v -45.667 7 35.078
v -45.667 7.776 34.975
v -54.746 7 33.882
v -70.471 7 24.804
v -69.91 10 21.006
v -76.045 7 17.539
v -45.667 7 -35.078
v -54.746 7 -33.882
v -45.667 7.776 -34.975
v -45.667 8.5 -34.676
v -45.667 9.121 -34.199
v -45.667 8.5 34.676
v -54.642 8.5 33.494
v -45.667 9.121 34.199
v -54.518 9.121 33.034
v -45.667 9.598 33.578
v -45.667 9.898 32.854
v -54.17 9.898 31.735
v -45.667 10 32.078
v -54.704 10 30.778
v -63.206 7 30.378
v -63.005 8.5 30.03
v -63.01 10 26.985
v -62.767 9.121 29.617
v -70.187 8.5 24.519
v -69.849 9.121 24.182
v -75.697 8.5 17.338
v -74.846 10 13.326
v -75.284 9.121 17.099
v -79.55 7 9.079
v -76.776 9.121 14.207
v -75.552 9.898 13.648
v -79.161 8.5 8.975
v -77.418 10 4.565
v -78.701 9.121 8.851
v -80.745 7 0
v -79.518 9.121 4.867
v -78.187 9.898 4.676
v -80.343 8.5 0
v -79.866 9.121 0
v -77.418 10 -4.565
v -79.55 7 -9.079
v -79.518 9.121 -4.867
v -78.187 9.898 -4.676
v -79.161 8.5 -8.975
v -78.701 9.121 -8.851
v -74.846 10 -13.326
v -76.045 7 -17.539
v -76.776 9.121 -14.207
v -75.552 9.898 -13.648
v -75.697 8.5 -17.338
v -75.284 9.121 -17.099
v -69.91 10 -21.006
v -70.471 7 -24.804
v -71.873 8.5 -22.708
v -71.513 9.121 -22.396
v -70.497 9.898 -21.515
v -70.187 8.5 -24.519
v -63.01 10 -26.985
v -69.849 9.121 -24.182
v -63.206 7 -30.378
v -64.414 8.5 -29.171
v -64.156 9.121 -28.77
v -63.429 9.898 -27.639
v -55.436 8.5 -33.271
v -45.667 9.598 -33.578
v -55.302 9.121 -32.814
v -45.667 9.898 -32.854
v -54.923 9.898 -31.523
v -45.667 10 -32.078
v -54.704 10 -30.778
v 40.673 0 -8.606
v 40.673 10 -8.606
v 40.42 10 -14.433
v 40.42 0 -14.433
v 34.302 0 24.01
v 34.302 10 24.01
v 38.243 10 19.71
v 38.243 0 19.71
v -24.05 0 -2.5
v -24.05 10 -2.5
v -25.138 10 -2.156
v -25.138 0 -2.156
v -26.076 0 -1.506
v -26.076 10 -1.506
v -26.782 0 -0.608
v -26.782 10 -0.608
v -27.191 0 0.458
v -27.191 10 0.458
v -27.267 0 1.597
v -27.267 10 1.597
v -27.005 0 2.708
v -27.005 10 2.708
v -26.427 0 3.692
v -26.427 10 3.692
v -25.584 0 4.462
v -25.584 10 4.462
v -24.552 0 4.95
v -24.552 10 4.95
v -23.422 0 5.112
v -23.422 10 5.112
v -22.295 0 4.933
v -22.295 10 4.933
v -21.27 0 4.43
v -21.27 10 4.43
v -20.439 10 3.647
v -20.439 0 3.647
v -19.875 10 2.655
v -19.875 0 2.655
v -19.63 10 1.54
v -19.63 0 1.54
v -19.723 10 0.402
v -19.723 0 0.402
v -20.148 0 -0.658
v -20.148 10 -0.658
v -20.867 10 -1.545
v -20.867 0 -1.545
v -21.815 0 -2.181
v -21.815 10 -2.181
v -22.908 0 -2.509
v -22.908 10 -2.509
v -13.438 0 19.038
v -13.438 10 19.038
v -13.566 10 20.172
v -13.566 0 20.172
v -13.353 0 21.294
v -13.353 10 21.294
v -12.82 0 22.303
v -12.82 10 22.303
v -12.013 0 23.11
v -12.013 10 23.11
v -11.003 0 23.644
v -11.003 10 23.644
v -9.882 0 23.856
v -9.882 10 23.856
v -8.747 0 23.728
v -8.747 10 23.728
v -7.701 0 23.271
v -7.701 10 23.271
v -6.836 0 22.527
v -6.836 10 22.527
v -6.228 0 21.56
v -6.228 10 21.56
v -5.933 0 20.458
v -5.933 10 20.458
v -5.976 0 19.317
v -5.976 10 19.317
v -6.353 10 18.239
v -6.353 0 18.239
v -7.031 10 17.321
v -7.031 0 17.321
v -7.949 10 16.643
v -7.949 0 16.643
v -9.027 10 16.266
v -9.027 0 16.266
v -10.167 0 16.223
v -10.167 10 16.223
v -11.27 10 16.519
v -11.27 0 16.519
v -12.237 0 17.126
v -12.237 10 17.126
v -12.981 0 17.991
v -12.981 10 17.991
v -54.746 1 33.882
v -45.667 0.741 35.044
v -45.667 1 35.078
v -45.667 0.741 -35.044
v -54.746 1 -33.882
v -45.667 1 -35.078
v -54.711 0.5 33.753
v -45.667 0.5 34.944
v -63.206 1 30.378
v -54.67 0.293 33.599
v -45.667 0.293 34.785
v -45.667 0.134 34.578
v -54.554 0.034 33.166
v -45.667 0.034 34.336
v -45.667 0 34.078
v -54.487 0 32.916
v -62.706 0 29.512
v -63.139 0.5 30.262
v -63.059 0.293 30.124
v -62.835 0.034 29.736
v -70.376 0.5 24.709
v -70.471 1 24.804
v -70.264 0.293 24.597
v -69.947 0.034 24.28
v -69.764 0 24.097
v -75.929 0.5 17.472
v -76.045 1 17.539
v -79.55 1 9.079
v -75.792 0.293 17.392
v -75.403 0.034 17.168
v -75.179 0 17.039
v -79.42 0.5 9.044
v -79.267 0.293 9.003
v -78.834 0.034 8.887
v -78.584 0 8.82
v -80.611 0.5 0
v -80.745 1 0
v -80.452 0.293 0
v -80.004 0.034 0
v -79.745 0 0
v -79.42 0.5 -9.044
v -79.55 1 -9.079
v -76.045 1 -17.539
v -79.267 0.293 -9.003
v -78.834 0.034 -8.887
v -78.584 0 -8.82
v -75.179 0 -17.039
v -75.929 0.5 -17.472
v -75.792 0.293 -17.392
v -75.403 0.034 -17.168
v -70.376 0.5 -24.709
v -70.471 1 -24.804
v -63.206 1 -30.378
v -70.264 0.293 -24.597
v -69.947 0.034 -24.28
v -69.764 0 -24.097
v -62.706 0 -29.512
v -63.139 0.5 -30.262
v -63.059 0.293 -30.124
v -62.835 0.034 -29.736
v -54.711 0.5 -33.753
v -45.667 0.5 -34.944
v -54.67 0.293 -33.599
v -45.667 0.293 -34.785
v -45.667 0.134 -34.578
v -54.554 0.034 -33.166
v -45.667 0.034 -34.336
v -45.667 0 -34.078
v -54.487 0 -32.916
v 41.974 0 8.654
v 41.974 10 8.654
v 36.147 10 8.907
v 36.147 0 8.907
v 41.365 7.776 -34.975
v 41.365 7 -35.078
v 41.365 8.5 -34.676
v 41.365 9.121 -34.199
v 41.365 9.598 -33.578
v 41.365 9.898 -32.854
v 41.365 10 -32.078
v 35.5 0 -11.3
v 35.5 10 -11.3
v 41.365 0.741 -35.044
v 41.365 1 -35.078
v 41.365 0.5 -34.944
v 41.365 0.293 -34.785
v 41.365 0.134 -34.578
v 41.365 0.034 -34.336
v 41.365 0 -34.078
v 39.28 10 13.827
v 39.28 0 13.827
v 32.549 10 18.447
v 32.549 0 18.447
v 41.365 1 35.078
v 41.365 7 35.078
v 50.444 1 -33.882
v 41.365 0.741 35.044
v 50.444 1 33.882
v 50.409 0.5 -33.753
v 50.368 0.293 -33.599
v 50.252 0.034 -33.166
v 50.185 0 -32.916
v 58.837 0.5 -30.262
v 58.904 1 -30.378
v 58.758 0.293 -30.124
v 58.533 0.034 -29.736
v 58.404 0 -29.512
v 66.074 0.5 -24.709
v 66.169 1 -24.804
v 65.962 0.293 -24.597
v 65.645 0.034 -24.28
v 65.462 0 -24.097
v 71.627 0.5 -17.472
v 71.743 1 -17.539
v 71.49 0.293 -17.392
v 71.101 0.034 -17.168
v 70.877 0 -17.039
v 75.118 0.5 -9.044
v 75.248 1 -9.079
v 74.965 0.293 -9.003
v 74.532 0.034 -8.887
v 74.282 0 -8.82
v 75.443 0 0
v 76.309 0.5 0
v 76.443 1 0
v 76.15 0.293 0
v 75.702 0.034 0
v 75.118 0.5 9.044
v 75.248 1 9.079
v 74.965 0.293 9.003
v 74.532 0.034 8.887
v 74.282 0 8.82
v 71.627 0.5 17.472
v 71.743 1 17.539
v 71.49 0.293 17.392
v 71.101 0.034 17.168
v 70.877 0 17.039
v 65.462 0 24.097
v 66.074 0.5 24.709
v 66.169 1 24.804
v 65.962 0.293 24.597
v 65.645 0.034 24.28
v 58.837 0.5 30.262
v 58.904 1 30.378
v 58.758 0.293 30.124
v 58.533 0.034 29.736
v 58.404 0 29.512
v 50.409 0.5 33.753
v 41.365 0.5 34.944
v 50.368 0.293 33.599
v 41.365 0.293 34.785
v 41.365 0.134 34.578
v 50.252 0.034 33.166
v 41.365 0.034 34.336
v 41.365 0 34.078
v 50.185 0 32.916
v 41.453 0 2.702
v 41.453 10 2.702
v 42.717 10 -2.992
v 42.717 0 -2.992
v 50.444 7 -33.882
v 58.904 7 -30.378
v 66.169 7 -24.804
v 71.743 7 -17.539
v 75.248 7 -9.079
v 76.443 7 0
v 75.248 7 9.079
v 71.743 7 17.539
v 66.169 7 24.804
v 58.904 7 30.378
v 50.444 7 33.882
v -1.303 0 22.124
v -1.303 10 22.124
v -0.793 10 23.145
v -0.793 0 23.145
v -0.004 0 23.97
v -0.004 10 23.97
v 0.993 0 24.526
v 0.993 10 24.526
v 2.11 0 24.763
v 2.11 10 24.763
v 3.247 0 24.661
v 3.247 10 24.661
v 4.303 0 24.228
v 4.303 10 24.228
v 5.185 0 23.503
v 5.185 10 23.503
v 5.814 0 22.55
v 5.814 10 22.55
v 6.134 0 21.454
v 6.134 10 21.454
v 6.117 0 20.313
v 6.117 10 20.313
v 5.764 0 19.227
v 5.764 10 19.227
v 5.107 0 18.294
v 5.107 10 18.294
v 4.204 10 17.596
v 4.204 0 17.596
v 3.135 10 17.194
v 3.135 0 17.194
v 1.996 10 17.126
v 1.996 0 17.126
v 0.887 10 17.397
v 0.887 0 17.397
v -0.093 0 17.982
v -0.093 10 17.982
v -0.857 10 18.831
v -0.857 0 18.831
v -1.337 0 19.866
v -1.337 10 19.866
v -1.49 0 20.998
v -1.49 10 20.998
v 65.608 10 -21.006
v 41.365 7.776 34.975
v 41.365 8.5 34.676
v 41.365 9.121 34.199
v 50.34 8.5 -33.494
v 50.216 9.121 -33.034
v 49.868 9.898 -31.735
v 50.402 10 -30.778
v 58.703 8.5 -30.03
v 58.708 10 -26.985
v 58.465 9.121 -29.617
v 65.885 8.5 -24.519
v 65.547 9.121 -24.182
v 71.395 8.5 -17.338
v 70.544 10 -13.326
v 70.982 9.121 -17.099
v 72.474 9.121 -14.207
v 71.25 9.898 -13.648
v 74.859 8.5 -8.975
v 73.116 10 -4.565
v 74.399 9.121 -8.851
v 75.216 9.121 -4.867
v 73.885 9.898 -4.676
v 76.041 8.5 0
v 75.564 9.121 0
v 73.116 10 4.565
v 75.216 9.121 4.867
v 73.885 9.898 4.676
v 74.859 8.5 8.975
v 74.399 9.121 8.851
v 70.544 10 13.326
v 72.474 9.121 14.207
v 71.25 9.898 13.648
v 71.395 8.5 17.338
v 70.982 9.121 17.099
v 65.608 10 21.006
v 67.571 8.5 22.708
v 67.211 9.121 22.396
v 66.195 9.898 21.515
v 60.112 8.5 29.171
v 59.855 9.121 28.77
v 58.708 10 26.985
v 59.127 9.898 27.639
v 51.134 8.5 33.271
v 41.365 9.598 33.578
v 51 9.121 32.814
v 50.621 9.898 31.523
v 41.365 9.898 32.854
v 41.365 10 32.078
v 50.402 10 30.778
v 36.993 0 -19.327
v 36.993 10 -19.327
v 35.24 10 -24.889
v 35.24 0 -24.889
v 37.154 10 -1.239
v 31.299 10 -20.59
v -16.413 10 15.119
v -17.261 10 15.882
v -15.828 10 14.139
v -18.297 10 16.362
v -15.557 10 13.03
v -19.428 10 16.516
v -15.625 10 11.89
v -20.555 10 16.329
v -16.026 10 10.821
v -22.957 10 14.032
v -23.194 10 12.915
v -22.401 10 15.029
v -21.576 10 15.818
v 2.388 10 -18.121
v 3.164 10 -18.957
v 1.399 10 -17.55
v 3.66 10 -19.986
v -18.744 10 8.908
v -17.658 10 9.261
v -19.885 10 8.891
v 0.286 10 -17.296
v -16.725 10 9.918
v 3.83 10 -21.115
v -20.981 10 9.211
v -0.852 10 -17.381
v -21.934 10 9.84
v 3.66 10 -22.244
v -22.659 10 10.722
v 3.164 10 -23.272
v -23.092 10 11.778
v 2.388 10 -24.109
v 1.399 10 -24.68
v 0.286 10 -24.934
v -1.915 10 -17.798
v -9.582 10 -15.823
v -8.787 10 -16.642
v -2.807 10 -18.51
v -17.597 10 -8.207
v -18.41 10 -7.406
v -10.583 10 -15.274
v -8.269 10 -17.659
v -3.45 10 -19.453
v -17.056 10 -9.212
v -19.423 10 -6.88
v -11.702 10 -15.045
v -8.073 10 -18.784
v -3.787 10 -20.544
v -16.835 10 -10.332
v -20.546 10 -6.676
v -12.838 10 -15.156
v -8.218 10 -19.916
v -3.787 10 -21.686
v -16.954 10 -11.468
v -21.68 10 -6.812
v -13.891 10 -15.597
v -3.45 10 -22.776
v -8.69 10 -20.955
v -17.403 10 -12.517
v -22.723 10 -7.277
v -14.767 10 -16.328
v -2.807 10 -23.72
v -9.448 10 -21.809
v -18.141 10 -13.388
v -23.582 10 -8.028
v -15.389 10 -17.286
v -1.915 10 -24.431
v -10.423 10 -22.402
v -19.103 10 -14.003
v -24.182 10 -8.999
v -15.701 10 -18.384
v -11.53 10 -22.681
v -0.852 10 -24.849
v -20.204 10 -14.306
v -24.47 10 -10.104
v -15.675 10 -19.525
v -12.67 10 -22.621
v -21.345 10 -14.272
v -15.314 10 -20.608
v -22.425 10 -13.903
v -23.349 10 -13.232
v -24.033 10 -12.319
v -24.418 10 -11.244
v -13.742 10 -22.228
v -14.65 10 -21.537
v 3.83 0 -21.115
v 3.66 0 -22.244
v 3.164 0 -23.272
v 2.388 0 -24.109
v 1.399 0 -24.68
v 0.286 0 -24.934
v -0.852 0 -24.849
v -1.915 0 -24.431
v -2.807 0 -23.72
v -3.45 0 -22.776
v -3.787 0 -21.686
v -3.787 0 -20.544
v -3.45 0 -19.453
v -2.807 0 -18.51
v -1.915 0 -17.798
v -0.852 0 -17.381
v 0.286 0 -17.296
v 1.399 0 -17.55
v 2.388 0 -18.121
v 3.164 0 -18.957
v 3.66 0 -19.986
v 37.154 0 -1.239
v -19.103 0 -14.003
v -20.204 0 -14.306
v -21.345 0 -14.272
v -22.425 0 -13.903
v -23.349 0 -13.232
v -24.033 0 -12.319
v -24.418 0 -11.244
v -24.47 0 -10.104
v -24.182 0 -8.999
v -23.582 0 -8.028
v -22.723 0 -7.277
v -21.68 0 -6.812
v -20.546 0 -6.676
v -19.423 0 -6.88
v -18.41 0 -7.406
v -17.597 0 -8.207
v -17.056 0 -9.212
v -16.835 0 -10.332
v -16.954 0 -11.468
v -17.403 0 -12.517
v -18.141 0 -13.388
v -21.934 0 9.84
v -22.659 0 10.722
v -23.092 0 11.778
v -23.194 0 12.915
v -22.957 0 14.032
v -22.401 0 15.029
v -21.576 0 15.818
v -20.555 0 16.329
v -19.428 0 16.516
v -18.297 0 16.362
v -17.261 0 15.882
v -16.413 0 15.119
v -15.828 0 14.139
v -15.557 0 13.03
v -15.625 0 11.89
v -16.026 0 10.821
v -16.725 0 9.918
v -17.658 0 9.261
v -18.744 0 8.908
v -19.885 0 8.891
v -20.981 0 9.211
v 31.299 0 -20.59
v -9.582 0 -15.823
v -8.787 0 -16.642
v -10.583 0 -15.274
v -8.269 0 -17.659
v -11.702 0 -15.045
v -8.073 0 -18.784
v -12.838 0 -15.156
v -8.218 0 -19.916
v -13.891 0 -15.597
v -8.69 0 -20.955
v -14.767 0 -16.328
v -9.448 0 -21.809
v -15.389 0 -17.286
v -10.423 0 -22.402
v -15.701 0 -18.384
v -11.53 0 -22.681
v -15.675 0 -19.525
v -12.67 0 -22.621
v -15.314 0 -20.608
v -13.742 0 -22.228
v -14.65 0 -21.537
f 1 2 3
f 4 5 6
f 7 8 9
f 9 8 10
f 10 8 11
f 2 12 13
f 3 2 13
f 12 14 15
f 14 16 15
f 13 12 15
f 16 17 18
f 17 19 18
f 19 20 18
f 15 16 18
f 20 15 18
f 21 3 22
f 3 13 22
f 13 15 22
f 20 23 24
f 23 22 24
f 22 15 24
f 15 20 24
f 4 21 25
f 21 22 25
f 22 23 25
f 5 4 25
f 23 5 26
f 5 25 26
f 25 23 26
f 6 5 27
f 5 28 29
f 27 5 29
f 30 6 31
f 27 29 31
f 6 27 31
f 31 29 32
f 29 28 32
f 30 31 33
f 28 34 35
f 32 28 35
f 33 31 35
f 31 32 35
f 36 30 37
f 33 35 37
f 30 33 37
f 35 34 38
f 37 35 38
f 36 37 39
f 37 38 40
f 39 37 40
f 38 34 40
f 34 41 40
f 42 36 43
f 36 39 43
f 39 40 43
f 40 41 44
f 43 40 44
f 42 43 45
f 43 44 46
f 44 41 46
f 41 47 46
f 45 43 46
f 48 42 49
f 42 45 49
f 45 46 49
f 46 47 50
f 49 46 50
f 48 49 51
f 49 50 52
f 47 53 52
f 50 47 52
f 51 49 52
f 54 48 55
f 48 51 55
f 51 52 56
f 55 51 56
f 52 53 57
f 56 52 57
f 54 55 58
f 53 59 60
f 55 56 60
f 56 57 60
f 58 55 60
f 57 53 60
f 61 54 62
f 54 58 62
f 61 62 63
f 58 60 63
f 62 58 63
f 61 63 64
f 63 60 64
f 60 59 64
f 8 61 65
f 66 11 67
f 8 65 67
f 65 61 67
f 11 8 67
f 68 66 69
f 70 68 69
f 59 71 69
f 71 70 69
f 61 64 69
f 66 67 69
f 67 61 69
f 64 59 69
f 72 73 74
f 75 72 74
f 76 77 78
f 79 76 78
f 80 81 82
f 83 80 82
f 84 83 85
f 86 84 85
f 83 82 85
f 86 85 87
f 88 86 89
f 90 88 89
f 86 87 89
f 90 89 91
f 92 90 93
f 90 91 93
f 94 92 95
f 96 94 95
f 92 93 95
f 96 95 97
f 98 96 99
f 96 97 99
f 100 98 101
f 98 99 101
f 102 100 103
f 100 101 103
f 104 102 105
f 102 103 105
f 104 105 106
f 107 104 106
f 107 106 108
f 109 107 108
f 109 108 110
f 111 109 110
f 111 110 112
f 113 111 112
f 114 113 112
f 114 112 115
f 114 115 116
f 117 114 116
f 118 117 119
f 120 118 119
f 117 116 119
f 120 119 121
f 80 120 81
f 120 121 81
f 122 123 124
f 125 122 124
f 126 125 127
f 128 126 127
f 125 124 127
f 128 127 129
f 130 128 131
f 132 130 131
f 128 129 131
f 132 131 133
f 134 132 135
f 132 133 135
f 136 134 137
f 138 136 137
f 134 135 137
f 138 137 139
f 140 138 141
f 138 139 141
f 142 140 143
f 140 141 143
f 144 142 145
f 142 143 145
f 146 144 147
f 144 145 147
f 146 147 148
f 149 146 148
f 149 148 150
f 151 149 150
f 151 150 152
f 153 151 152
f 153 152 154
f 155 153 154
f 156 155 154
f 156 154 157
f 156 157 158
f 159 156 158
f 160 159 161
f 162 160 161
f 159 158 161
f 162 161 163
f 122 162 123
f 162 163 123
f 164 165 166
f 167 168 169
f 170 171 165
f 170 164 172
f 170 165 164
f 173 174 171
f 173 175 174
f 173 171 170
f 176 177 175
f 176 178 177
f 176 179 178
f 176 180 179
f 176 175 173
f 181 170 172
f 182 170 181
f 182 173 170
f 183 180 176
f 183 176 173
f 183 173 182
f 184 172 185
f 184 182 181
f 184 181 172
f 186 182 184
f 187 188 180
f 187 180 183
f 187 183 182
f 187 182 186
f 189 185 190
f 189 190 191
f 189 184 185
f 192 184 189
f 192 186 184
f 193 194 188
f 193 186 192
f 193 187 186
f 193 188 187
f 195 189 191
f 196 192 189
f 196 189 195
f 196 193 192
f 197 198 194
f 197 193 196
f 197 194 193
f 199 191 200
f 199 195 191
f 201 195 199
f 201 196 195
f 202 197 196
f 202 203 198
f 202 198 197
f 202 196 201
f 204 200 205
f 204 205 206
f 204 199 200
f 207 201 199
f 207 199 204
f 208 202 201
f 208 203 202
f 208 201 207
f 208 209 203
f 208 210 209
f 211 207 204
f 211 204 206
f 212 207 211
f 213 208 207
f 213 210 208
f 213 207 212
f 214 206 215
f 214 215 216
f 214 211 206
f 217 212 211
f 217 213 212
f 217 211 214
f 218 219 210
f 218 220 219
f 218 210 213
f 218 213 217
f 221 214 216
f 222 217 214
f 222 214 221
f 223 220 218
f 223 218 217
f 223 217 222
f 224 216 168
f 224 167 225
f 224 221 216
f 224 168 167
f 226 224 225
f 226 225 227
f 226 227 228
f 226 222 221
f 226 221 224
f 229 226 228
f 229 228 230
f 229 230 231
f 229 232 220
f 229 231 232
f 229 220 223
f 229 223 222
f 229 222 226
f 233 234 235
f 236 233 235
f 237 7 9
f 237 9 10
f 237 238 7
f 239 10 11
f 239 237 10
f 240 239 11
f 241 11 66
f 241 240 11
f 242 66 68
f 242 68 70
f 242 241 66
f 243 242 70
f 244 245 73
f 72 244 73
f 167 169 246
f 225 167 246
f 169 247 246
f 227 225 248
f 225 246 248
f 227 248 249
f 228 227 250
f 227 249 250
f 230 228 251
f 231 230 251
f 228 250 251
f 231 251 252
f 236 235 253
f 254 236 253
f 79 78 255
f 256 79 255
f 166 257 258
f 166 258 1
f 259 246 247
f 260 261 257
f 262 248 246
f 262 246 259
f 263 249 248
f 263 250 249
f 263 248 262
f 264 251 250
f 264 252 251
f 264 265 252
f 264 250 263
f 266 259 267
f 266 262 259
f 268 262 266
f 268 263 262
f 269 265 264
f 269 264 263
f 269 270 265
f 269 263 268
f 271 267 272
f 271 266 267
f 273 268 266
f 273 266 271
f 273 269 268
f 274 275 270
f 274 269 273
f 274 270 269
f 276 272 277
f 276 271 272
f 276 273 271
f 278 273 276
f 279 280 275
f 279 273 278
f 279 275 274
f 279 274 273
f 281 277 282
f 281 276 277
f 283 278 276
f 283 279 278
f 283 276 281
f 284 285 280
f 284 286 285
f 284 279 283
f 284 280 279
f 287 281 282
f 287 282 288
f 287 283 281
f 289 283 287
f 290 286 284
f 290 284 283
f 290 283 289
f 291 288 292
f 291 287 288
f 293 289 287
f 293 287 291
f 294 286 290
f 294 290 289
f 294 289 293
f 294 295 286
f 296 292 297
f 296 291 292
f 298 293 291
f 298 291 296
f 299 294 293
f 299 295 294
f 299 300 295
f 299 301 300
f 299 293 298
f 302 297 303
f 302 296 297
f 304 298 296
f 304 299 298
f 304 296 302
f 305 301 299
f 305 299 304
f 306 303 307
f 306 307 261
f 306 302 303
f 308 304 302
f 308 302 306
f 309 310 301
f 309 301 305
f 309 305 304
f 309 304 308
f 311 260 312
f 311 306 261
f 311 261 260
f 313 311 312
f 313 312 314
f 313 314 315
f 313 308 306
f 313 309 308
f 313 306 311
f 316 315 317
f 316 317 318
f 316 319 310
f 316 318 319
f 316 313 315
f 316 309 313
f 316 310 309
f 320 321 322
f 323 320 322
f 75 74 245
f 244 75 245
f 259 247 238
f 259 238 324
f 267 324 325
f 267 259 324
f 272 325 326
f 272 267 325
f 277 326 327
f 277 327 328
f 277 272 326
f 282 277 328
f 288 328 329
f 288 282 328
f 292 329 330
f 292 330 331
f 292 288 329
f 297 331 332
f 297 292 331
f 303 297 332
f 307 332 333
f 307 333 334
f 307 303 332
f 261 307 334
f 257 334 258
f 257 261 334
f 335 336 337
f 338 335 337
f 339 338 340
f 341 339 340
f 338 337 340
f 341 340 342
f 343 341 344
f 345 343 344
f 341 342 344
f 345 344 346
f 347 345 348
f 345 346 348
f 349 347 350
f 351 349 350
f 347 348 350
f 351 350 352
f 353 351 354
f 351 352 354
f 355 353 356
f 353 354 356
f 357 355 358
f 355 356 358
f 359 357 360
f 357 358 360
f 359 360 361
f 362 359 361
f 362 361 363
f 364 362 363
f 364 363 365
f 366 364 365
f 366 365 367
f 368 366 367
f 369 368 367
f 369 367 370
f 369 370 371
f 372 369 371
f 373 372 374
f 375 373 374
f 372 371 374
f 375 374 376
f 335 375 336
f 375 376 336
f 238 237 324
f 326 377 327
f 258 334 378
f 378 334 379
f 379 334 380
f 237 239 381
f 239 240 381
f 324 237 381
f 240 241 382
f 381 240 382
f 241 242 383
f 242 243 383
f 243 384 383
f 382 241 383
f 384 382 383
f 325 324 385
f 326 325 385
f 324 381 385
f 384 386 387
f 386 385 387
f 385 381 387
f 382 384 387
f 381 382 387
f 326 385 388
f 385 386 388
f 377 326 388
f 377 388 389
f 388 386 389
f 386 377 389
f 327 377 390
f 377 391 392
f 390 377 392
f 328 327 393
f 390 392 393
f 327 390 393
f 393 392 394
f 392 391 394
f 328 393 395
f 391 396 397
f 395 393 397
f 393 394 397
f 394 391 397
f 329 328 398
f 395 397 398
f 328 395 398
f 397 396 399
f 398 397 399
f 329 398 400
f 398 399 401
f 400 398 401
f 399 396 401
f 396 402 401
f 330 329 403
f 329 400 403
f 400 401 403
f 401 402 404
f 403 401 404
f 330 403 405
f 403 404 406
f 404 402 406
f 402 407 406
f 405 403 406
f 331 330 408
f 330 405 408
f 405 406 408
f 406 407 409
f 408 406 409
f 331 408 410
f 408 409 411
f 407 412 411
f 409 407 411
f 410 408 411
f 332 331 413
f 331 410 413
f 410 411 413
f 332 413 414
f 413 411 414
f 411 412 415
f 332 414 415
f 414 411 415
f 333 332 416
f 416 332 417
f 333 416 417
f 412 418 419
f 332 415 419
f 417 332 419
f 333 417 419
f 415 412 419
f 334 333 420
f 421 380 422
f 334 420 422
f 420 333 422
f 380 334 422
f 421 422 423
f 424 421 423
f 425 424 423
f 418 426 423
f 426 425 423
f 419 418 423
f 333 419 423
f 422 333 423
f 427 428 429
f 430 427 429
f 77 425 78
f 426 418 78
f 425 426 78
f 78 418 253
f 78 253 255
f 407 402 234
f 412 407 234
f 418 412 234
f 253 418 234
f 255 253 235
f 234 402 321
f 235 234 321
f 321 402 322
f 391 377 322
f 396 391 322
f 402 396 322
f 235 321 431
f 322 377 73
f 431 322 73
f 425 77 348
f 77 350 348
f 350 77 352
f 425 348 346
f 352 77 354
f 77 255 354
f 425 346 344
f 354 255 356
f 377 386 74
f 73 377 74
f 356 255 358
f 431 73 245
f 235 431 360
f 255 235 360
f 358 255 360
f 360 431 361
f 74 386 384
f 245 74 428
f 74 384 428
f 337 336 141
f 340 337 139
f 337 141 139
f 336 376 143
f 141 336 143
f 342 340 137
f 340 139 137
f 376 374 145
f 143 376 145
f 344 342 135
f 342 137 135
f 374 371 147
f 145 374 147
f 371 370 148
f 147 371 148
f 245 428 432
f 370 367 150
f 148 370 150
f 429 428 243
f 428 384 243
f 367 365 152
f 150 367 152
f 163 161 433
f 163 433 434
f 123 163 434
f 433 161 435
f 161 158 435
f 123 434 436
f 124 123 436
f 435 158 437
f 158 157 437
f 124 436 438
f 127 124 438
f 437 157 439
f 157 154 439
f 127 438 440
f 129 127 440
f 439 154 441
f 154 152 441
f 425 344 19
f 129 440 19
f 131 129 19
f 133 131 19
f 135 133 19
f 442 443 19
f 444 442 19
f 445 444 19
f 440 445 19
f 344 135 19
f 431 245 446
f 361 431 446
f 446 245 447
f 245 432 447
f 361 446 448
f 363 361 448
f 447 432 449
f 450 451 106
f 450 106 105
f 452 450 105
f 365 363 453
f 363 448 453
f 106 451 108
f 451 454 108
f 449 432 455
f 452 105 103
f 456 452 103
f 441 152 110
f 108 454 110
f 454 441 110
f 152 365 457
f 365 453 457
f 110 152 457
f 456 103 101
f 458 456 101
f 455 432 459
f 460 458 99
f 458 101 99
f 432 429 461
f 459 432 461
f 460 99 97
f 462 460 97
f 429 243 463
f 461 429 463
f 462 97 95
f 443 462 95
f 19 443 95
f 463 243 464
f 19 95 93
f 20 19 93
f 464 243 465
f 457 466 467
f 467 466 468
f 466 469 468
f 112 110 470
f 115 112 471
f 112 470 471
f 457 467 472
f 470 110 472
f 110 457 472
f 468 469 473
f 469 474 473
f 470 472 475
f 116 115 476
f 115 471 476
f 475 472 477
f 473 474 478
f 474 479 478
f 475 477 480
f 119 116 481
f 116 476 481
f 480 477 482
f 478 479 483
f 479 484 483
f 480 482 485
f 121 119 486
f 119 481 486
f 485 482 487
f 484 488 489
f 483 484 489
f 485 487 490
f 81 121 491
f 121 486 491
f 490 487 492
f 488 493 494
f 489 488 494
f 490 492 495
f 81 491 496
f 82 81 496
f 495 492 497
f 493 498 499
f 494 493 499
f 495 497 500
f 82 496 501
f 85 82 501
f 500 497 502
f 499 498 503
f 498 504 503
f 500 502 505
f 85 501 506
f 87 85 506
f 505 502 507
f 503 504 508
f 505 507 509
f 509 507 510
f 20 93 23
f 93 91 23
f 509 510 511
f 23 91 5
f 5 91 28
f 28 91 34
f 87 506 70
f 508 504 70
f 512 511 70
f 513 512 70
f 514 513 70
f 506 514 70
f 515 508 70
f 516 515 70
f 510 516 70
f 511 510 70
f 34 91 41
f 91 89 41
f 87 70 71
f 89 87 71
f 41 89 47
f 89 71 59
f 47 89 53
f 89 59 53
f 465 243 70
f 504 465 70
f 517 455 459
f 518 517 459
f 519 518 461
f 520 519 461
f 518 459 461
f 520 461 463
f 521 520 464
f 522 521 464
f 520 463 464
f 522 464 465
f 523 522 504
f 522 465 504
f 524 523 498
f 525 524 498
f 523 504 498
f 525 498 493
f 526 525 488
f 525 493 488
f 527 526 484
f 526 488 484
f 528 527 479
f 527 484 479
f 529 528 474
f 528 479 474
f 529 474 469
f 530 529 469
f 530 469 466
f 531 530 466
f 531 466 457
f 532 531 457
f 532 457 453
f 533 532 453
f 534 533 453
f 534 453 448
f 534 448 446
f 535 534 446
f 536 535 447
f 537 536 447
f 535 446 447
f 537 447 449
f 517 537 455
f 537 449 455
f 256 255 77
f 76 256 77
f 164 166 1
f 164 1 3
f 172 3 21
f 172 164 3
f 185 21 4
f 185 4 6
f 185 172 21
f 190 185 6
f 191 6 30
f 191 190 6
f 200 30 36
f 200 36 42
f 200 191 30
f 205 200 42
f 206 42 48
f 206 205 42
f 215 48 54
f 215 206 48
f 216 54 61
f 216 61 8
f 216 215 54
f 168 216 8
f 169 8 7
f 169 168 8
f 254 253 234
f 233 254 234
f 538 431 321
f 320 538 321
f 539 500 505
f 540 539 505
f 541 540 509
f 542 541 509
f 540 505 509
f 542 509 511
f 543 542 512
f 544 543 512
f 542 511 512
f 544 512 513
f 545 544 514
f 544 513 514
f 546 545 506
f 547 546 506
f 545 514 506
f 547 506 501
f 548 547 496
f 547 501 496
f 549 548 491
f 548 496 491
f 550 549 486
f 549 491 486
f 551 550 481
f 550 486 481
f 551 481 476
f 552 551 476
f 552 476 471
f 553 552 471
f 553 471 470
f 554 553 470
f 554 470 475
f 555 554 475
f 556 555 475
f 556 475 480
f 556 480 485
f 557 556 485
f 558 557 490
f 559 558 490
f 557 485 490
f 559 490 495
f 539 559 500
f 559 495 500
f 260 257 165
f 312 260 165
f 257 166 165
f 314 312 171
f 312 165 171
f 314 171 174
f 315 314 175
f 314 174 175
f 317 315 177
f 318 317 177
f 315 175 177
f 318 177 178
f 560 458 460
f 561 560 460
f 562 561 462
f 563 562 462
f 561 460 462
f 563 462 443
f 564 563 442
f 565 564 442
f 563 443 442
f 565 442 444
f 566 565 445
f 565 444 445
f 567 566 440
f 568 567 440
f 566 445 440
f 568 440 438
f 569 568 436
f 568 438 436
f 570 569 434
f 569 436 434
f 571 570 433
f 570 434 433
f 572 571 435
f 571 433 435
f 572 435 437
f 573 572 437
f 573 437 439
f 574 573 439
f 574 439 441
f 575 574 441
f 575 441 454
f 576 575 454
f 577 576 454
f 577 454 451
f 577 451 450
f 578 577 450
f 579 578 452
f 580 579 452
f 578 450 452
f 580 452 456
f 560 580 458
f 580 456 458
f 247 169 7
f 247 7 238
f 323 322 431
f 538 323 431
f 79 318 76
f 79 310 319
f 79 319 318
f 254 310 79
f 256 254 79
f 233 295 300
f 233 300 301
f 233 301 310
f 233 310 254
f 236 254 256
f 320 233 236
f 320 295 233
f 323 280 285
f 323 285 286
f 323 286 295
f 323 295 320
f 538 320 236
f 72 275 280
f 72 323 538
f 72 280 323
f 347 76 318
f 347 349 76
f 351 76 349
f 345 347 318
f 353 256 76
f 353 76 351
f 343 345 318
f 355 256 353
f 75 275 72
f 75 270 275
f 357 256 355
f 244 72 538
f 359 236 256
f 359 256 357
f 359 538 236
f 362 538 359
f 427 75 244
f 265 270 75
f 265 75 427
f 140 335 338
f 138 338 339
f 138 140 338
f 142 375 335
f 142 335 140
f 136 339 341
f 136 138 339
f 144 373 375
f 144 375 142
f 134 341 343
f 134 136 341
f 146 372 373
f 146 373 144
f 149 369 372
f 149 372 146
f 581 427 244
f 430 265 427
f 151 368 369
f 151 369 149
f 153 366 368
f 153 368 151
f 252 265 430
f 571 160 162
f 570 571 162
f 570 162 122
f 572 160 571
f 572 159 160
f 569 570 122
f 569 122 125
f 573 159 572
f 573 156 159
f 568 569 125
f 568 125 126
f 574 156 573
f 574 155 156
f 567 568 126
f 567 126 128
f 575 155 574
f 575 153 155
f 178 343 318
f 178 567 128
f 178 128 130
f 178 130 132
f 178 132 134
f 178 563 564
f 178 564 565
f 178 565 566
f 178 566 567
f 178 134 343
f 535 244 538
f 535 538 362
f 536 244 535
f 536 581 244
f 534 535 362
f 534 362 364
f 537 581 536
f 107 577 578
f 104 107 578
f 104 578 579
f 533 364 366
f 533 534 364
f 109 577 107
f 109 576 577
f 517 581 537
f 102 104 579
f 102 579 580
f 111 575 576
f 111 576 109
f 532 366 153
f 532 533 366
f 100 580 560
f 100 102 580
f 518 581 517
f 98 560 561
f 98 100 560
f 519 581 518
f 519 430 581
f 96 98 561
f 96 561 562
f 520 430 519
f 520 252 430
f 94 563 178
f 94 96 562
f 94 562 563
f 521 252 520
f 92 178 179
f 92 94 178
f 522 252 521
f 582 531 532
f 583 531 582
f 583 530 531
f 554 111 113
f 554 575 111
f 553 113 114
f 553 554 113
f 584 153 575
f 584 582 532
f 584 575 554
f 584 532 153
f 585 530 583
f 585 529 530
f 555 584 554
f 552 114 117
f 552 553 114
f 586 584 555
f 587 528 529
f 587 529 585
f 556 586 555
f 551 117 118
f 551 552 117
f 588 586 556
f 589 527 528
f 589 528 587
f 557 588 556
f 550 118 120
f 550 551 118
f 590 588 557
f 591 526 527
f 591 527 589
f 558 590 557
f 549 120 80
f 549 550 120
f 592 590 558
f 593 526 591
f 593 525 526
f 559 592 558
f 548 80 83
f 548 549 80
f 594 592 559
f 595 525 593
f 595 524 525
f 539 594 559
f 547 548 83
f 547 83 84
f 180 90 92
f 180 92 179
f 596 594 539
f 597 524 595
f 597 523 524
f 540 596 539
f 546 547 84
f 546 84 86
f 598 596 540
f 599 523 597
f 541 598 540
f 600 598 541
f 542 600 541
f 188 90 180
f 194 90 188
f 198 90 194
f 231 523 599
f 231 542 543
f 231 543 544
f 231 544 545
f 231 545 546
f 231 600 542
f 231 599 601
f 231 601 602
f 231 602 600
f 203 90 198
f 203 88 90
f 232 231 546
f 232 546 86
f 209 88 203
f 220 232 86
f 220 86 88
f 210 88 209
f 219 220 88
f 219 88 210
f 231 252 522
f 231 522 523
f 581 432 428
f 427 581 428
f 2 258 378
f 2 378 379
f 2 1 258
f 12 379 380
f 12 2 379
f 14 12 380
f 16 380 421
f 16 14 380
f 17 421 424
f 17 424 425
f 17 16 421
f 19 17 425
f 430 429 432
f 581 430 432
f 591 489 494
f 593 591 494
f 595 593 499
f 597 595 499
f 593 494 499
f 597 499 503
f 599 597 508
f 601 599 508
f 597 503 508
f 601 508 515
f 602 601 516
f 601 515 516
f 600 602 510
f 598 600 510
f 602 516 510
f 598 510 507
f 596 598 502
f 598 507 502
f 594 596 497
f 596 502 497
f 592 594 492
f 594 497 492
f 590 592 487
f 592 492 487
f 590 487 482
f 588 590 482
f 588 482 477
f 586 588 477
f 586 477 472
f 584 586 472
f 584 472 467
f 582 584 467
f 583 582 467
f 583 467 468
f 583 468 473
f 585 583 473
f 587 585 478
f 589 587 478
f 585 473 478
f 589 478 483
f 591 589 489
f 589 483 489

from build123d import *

# Parameters (mm, degrees)
BOSS_EXTRUDE1_DEPTH = 10
SKETCH2_R           = 3.829706391
CUT_EXTRUDE1_DEPTH  = 10
CIRPATTERN1_COUNT   = 7
CIRPATTERN1_ANGLE   = 198
CUT_EXTRUDE2_DEPTH  = 10
CIRPATTERN2_COUNT   = 5
CIRPATTERN2_ANGLE   = 60
FILLET1_R           = 3
FILLET2_R           = 1


with BuildPart() as part:
    # Sketch1 → Boss-Extrude1 (new body)
    with BuildSketch(Plane(origin=(0, 0, 0), x_dir=(1, 0, 0), z_dir=(0, 1, 0))):
        with BuildLine():
            Line((-45.667120744, 35.07764347), (41.365145602, 35.07764347))
            ThreePointArc((41.365145602, 35.07764347), (76.442789072, 0), (41.365145602, -35.07764347))
            Line((41.365145602, -35.07764347), (-45.667120744, -35.07764347))
            ThreePointArc((-45.667120744, -35.07764347), (-80.744764215, 0), (-45.667120744, 35.07764347))
        make_face()
    extrude(amount=BOSS_EXTRUDE1_DEPTH)

    # Sketch2 → Cut-Extrude1 (cut)
    with BuildSketch(Plane(origin=(0, 10, 0), x_dir=(1, 0, 0), z_dir=(0, 1, 0))):
        with Locations((0, 21.114814392)):
            Circle(SKETCH2_R)
    cut_extrude1 = extrude(amount=-CUT_EXTRUDE1_DEPTH, mode=Mode.SUBTRACT)

    # CirPattern1: Cut-Extrude1 ×7 about axis
    cirpattern1_axis = Axis((-2.160973251, 0, 0.098022779), (0, 1, 0))
    for i in range(1, CIRPATTERN1_COUNT):
        add(cut_extrude1.rotate(cirpattern1_axis, i * CIRPATTERN1_ANGLE / (CIRPATTERN1_COUNT - 1)), mode=Mode.SUBTRACT)

    # Sketch3 → Cut-Extrude2 (cut)
    with BuildSketch(Plane(origin=(0, 10, 0), x_dir=(1, 0, 0), z_dir=(0, 1, 0))):
        Polygon((36.992565085, 19.326531544), (35.239702282, 24.889438713), (31.298514755, 20.589961412), align=None)
    cut_extrude2 = extrude(amount=-CUT_EXTRUDE2_DEPTH, mode=Mode.SUBTRACT)

    # CirPattern2: Cut-Extrude2 ×5 about axis
    cirpattern2_axis = Axis((-1.883123212, 0, 0.01175113), (0, -1, 0))
    for i in range(1, CIRPATTERN2_COUNT):
        add(cut_extrude2.rotate(cirpattern2_axis, i * CIRPATTERN2_ANGLE / (CIRPATTERN2_COUNT - 1)), mode=Mode.SUBTRACT)

    # Fillet1
    fillet1_edges = [part.edges().sort_by_distance(p)[0] for p in [
        (76.442789072, 10, 0),
        (-2.150987571, 10, -35.07764347),
        (-80.744764215, 10, 0),
        (-2.150987571, 10, 35.07764347),
    ]]
    fillet(fillet1_edges, radius=FILLET1_R)

    # Fillet2
    fillet2_edges = [part.edges().sort_by_distance(p)[0] for p in [
        (-2.150987571, 0, -35.07764347),
        (76.442789072, 0, 0),
        (-2.150987571, 0, 35.07764347),
        (-80.744764215, 0, 0),
    ]]
    fillet(fillet2_edges, radius=FILLET2_R)


solid = part.part
